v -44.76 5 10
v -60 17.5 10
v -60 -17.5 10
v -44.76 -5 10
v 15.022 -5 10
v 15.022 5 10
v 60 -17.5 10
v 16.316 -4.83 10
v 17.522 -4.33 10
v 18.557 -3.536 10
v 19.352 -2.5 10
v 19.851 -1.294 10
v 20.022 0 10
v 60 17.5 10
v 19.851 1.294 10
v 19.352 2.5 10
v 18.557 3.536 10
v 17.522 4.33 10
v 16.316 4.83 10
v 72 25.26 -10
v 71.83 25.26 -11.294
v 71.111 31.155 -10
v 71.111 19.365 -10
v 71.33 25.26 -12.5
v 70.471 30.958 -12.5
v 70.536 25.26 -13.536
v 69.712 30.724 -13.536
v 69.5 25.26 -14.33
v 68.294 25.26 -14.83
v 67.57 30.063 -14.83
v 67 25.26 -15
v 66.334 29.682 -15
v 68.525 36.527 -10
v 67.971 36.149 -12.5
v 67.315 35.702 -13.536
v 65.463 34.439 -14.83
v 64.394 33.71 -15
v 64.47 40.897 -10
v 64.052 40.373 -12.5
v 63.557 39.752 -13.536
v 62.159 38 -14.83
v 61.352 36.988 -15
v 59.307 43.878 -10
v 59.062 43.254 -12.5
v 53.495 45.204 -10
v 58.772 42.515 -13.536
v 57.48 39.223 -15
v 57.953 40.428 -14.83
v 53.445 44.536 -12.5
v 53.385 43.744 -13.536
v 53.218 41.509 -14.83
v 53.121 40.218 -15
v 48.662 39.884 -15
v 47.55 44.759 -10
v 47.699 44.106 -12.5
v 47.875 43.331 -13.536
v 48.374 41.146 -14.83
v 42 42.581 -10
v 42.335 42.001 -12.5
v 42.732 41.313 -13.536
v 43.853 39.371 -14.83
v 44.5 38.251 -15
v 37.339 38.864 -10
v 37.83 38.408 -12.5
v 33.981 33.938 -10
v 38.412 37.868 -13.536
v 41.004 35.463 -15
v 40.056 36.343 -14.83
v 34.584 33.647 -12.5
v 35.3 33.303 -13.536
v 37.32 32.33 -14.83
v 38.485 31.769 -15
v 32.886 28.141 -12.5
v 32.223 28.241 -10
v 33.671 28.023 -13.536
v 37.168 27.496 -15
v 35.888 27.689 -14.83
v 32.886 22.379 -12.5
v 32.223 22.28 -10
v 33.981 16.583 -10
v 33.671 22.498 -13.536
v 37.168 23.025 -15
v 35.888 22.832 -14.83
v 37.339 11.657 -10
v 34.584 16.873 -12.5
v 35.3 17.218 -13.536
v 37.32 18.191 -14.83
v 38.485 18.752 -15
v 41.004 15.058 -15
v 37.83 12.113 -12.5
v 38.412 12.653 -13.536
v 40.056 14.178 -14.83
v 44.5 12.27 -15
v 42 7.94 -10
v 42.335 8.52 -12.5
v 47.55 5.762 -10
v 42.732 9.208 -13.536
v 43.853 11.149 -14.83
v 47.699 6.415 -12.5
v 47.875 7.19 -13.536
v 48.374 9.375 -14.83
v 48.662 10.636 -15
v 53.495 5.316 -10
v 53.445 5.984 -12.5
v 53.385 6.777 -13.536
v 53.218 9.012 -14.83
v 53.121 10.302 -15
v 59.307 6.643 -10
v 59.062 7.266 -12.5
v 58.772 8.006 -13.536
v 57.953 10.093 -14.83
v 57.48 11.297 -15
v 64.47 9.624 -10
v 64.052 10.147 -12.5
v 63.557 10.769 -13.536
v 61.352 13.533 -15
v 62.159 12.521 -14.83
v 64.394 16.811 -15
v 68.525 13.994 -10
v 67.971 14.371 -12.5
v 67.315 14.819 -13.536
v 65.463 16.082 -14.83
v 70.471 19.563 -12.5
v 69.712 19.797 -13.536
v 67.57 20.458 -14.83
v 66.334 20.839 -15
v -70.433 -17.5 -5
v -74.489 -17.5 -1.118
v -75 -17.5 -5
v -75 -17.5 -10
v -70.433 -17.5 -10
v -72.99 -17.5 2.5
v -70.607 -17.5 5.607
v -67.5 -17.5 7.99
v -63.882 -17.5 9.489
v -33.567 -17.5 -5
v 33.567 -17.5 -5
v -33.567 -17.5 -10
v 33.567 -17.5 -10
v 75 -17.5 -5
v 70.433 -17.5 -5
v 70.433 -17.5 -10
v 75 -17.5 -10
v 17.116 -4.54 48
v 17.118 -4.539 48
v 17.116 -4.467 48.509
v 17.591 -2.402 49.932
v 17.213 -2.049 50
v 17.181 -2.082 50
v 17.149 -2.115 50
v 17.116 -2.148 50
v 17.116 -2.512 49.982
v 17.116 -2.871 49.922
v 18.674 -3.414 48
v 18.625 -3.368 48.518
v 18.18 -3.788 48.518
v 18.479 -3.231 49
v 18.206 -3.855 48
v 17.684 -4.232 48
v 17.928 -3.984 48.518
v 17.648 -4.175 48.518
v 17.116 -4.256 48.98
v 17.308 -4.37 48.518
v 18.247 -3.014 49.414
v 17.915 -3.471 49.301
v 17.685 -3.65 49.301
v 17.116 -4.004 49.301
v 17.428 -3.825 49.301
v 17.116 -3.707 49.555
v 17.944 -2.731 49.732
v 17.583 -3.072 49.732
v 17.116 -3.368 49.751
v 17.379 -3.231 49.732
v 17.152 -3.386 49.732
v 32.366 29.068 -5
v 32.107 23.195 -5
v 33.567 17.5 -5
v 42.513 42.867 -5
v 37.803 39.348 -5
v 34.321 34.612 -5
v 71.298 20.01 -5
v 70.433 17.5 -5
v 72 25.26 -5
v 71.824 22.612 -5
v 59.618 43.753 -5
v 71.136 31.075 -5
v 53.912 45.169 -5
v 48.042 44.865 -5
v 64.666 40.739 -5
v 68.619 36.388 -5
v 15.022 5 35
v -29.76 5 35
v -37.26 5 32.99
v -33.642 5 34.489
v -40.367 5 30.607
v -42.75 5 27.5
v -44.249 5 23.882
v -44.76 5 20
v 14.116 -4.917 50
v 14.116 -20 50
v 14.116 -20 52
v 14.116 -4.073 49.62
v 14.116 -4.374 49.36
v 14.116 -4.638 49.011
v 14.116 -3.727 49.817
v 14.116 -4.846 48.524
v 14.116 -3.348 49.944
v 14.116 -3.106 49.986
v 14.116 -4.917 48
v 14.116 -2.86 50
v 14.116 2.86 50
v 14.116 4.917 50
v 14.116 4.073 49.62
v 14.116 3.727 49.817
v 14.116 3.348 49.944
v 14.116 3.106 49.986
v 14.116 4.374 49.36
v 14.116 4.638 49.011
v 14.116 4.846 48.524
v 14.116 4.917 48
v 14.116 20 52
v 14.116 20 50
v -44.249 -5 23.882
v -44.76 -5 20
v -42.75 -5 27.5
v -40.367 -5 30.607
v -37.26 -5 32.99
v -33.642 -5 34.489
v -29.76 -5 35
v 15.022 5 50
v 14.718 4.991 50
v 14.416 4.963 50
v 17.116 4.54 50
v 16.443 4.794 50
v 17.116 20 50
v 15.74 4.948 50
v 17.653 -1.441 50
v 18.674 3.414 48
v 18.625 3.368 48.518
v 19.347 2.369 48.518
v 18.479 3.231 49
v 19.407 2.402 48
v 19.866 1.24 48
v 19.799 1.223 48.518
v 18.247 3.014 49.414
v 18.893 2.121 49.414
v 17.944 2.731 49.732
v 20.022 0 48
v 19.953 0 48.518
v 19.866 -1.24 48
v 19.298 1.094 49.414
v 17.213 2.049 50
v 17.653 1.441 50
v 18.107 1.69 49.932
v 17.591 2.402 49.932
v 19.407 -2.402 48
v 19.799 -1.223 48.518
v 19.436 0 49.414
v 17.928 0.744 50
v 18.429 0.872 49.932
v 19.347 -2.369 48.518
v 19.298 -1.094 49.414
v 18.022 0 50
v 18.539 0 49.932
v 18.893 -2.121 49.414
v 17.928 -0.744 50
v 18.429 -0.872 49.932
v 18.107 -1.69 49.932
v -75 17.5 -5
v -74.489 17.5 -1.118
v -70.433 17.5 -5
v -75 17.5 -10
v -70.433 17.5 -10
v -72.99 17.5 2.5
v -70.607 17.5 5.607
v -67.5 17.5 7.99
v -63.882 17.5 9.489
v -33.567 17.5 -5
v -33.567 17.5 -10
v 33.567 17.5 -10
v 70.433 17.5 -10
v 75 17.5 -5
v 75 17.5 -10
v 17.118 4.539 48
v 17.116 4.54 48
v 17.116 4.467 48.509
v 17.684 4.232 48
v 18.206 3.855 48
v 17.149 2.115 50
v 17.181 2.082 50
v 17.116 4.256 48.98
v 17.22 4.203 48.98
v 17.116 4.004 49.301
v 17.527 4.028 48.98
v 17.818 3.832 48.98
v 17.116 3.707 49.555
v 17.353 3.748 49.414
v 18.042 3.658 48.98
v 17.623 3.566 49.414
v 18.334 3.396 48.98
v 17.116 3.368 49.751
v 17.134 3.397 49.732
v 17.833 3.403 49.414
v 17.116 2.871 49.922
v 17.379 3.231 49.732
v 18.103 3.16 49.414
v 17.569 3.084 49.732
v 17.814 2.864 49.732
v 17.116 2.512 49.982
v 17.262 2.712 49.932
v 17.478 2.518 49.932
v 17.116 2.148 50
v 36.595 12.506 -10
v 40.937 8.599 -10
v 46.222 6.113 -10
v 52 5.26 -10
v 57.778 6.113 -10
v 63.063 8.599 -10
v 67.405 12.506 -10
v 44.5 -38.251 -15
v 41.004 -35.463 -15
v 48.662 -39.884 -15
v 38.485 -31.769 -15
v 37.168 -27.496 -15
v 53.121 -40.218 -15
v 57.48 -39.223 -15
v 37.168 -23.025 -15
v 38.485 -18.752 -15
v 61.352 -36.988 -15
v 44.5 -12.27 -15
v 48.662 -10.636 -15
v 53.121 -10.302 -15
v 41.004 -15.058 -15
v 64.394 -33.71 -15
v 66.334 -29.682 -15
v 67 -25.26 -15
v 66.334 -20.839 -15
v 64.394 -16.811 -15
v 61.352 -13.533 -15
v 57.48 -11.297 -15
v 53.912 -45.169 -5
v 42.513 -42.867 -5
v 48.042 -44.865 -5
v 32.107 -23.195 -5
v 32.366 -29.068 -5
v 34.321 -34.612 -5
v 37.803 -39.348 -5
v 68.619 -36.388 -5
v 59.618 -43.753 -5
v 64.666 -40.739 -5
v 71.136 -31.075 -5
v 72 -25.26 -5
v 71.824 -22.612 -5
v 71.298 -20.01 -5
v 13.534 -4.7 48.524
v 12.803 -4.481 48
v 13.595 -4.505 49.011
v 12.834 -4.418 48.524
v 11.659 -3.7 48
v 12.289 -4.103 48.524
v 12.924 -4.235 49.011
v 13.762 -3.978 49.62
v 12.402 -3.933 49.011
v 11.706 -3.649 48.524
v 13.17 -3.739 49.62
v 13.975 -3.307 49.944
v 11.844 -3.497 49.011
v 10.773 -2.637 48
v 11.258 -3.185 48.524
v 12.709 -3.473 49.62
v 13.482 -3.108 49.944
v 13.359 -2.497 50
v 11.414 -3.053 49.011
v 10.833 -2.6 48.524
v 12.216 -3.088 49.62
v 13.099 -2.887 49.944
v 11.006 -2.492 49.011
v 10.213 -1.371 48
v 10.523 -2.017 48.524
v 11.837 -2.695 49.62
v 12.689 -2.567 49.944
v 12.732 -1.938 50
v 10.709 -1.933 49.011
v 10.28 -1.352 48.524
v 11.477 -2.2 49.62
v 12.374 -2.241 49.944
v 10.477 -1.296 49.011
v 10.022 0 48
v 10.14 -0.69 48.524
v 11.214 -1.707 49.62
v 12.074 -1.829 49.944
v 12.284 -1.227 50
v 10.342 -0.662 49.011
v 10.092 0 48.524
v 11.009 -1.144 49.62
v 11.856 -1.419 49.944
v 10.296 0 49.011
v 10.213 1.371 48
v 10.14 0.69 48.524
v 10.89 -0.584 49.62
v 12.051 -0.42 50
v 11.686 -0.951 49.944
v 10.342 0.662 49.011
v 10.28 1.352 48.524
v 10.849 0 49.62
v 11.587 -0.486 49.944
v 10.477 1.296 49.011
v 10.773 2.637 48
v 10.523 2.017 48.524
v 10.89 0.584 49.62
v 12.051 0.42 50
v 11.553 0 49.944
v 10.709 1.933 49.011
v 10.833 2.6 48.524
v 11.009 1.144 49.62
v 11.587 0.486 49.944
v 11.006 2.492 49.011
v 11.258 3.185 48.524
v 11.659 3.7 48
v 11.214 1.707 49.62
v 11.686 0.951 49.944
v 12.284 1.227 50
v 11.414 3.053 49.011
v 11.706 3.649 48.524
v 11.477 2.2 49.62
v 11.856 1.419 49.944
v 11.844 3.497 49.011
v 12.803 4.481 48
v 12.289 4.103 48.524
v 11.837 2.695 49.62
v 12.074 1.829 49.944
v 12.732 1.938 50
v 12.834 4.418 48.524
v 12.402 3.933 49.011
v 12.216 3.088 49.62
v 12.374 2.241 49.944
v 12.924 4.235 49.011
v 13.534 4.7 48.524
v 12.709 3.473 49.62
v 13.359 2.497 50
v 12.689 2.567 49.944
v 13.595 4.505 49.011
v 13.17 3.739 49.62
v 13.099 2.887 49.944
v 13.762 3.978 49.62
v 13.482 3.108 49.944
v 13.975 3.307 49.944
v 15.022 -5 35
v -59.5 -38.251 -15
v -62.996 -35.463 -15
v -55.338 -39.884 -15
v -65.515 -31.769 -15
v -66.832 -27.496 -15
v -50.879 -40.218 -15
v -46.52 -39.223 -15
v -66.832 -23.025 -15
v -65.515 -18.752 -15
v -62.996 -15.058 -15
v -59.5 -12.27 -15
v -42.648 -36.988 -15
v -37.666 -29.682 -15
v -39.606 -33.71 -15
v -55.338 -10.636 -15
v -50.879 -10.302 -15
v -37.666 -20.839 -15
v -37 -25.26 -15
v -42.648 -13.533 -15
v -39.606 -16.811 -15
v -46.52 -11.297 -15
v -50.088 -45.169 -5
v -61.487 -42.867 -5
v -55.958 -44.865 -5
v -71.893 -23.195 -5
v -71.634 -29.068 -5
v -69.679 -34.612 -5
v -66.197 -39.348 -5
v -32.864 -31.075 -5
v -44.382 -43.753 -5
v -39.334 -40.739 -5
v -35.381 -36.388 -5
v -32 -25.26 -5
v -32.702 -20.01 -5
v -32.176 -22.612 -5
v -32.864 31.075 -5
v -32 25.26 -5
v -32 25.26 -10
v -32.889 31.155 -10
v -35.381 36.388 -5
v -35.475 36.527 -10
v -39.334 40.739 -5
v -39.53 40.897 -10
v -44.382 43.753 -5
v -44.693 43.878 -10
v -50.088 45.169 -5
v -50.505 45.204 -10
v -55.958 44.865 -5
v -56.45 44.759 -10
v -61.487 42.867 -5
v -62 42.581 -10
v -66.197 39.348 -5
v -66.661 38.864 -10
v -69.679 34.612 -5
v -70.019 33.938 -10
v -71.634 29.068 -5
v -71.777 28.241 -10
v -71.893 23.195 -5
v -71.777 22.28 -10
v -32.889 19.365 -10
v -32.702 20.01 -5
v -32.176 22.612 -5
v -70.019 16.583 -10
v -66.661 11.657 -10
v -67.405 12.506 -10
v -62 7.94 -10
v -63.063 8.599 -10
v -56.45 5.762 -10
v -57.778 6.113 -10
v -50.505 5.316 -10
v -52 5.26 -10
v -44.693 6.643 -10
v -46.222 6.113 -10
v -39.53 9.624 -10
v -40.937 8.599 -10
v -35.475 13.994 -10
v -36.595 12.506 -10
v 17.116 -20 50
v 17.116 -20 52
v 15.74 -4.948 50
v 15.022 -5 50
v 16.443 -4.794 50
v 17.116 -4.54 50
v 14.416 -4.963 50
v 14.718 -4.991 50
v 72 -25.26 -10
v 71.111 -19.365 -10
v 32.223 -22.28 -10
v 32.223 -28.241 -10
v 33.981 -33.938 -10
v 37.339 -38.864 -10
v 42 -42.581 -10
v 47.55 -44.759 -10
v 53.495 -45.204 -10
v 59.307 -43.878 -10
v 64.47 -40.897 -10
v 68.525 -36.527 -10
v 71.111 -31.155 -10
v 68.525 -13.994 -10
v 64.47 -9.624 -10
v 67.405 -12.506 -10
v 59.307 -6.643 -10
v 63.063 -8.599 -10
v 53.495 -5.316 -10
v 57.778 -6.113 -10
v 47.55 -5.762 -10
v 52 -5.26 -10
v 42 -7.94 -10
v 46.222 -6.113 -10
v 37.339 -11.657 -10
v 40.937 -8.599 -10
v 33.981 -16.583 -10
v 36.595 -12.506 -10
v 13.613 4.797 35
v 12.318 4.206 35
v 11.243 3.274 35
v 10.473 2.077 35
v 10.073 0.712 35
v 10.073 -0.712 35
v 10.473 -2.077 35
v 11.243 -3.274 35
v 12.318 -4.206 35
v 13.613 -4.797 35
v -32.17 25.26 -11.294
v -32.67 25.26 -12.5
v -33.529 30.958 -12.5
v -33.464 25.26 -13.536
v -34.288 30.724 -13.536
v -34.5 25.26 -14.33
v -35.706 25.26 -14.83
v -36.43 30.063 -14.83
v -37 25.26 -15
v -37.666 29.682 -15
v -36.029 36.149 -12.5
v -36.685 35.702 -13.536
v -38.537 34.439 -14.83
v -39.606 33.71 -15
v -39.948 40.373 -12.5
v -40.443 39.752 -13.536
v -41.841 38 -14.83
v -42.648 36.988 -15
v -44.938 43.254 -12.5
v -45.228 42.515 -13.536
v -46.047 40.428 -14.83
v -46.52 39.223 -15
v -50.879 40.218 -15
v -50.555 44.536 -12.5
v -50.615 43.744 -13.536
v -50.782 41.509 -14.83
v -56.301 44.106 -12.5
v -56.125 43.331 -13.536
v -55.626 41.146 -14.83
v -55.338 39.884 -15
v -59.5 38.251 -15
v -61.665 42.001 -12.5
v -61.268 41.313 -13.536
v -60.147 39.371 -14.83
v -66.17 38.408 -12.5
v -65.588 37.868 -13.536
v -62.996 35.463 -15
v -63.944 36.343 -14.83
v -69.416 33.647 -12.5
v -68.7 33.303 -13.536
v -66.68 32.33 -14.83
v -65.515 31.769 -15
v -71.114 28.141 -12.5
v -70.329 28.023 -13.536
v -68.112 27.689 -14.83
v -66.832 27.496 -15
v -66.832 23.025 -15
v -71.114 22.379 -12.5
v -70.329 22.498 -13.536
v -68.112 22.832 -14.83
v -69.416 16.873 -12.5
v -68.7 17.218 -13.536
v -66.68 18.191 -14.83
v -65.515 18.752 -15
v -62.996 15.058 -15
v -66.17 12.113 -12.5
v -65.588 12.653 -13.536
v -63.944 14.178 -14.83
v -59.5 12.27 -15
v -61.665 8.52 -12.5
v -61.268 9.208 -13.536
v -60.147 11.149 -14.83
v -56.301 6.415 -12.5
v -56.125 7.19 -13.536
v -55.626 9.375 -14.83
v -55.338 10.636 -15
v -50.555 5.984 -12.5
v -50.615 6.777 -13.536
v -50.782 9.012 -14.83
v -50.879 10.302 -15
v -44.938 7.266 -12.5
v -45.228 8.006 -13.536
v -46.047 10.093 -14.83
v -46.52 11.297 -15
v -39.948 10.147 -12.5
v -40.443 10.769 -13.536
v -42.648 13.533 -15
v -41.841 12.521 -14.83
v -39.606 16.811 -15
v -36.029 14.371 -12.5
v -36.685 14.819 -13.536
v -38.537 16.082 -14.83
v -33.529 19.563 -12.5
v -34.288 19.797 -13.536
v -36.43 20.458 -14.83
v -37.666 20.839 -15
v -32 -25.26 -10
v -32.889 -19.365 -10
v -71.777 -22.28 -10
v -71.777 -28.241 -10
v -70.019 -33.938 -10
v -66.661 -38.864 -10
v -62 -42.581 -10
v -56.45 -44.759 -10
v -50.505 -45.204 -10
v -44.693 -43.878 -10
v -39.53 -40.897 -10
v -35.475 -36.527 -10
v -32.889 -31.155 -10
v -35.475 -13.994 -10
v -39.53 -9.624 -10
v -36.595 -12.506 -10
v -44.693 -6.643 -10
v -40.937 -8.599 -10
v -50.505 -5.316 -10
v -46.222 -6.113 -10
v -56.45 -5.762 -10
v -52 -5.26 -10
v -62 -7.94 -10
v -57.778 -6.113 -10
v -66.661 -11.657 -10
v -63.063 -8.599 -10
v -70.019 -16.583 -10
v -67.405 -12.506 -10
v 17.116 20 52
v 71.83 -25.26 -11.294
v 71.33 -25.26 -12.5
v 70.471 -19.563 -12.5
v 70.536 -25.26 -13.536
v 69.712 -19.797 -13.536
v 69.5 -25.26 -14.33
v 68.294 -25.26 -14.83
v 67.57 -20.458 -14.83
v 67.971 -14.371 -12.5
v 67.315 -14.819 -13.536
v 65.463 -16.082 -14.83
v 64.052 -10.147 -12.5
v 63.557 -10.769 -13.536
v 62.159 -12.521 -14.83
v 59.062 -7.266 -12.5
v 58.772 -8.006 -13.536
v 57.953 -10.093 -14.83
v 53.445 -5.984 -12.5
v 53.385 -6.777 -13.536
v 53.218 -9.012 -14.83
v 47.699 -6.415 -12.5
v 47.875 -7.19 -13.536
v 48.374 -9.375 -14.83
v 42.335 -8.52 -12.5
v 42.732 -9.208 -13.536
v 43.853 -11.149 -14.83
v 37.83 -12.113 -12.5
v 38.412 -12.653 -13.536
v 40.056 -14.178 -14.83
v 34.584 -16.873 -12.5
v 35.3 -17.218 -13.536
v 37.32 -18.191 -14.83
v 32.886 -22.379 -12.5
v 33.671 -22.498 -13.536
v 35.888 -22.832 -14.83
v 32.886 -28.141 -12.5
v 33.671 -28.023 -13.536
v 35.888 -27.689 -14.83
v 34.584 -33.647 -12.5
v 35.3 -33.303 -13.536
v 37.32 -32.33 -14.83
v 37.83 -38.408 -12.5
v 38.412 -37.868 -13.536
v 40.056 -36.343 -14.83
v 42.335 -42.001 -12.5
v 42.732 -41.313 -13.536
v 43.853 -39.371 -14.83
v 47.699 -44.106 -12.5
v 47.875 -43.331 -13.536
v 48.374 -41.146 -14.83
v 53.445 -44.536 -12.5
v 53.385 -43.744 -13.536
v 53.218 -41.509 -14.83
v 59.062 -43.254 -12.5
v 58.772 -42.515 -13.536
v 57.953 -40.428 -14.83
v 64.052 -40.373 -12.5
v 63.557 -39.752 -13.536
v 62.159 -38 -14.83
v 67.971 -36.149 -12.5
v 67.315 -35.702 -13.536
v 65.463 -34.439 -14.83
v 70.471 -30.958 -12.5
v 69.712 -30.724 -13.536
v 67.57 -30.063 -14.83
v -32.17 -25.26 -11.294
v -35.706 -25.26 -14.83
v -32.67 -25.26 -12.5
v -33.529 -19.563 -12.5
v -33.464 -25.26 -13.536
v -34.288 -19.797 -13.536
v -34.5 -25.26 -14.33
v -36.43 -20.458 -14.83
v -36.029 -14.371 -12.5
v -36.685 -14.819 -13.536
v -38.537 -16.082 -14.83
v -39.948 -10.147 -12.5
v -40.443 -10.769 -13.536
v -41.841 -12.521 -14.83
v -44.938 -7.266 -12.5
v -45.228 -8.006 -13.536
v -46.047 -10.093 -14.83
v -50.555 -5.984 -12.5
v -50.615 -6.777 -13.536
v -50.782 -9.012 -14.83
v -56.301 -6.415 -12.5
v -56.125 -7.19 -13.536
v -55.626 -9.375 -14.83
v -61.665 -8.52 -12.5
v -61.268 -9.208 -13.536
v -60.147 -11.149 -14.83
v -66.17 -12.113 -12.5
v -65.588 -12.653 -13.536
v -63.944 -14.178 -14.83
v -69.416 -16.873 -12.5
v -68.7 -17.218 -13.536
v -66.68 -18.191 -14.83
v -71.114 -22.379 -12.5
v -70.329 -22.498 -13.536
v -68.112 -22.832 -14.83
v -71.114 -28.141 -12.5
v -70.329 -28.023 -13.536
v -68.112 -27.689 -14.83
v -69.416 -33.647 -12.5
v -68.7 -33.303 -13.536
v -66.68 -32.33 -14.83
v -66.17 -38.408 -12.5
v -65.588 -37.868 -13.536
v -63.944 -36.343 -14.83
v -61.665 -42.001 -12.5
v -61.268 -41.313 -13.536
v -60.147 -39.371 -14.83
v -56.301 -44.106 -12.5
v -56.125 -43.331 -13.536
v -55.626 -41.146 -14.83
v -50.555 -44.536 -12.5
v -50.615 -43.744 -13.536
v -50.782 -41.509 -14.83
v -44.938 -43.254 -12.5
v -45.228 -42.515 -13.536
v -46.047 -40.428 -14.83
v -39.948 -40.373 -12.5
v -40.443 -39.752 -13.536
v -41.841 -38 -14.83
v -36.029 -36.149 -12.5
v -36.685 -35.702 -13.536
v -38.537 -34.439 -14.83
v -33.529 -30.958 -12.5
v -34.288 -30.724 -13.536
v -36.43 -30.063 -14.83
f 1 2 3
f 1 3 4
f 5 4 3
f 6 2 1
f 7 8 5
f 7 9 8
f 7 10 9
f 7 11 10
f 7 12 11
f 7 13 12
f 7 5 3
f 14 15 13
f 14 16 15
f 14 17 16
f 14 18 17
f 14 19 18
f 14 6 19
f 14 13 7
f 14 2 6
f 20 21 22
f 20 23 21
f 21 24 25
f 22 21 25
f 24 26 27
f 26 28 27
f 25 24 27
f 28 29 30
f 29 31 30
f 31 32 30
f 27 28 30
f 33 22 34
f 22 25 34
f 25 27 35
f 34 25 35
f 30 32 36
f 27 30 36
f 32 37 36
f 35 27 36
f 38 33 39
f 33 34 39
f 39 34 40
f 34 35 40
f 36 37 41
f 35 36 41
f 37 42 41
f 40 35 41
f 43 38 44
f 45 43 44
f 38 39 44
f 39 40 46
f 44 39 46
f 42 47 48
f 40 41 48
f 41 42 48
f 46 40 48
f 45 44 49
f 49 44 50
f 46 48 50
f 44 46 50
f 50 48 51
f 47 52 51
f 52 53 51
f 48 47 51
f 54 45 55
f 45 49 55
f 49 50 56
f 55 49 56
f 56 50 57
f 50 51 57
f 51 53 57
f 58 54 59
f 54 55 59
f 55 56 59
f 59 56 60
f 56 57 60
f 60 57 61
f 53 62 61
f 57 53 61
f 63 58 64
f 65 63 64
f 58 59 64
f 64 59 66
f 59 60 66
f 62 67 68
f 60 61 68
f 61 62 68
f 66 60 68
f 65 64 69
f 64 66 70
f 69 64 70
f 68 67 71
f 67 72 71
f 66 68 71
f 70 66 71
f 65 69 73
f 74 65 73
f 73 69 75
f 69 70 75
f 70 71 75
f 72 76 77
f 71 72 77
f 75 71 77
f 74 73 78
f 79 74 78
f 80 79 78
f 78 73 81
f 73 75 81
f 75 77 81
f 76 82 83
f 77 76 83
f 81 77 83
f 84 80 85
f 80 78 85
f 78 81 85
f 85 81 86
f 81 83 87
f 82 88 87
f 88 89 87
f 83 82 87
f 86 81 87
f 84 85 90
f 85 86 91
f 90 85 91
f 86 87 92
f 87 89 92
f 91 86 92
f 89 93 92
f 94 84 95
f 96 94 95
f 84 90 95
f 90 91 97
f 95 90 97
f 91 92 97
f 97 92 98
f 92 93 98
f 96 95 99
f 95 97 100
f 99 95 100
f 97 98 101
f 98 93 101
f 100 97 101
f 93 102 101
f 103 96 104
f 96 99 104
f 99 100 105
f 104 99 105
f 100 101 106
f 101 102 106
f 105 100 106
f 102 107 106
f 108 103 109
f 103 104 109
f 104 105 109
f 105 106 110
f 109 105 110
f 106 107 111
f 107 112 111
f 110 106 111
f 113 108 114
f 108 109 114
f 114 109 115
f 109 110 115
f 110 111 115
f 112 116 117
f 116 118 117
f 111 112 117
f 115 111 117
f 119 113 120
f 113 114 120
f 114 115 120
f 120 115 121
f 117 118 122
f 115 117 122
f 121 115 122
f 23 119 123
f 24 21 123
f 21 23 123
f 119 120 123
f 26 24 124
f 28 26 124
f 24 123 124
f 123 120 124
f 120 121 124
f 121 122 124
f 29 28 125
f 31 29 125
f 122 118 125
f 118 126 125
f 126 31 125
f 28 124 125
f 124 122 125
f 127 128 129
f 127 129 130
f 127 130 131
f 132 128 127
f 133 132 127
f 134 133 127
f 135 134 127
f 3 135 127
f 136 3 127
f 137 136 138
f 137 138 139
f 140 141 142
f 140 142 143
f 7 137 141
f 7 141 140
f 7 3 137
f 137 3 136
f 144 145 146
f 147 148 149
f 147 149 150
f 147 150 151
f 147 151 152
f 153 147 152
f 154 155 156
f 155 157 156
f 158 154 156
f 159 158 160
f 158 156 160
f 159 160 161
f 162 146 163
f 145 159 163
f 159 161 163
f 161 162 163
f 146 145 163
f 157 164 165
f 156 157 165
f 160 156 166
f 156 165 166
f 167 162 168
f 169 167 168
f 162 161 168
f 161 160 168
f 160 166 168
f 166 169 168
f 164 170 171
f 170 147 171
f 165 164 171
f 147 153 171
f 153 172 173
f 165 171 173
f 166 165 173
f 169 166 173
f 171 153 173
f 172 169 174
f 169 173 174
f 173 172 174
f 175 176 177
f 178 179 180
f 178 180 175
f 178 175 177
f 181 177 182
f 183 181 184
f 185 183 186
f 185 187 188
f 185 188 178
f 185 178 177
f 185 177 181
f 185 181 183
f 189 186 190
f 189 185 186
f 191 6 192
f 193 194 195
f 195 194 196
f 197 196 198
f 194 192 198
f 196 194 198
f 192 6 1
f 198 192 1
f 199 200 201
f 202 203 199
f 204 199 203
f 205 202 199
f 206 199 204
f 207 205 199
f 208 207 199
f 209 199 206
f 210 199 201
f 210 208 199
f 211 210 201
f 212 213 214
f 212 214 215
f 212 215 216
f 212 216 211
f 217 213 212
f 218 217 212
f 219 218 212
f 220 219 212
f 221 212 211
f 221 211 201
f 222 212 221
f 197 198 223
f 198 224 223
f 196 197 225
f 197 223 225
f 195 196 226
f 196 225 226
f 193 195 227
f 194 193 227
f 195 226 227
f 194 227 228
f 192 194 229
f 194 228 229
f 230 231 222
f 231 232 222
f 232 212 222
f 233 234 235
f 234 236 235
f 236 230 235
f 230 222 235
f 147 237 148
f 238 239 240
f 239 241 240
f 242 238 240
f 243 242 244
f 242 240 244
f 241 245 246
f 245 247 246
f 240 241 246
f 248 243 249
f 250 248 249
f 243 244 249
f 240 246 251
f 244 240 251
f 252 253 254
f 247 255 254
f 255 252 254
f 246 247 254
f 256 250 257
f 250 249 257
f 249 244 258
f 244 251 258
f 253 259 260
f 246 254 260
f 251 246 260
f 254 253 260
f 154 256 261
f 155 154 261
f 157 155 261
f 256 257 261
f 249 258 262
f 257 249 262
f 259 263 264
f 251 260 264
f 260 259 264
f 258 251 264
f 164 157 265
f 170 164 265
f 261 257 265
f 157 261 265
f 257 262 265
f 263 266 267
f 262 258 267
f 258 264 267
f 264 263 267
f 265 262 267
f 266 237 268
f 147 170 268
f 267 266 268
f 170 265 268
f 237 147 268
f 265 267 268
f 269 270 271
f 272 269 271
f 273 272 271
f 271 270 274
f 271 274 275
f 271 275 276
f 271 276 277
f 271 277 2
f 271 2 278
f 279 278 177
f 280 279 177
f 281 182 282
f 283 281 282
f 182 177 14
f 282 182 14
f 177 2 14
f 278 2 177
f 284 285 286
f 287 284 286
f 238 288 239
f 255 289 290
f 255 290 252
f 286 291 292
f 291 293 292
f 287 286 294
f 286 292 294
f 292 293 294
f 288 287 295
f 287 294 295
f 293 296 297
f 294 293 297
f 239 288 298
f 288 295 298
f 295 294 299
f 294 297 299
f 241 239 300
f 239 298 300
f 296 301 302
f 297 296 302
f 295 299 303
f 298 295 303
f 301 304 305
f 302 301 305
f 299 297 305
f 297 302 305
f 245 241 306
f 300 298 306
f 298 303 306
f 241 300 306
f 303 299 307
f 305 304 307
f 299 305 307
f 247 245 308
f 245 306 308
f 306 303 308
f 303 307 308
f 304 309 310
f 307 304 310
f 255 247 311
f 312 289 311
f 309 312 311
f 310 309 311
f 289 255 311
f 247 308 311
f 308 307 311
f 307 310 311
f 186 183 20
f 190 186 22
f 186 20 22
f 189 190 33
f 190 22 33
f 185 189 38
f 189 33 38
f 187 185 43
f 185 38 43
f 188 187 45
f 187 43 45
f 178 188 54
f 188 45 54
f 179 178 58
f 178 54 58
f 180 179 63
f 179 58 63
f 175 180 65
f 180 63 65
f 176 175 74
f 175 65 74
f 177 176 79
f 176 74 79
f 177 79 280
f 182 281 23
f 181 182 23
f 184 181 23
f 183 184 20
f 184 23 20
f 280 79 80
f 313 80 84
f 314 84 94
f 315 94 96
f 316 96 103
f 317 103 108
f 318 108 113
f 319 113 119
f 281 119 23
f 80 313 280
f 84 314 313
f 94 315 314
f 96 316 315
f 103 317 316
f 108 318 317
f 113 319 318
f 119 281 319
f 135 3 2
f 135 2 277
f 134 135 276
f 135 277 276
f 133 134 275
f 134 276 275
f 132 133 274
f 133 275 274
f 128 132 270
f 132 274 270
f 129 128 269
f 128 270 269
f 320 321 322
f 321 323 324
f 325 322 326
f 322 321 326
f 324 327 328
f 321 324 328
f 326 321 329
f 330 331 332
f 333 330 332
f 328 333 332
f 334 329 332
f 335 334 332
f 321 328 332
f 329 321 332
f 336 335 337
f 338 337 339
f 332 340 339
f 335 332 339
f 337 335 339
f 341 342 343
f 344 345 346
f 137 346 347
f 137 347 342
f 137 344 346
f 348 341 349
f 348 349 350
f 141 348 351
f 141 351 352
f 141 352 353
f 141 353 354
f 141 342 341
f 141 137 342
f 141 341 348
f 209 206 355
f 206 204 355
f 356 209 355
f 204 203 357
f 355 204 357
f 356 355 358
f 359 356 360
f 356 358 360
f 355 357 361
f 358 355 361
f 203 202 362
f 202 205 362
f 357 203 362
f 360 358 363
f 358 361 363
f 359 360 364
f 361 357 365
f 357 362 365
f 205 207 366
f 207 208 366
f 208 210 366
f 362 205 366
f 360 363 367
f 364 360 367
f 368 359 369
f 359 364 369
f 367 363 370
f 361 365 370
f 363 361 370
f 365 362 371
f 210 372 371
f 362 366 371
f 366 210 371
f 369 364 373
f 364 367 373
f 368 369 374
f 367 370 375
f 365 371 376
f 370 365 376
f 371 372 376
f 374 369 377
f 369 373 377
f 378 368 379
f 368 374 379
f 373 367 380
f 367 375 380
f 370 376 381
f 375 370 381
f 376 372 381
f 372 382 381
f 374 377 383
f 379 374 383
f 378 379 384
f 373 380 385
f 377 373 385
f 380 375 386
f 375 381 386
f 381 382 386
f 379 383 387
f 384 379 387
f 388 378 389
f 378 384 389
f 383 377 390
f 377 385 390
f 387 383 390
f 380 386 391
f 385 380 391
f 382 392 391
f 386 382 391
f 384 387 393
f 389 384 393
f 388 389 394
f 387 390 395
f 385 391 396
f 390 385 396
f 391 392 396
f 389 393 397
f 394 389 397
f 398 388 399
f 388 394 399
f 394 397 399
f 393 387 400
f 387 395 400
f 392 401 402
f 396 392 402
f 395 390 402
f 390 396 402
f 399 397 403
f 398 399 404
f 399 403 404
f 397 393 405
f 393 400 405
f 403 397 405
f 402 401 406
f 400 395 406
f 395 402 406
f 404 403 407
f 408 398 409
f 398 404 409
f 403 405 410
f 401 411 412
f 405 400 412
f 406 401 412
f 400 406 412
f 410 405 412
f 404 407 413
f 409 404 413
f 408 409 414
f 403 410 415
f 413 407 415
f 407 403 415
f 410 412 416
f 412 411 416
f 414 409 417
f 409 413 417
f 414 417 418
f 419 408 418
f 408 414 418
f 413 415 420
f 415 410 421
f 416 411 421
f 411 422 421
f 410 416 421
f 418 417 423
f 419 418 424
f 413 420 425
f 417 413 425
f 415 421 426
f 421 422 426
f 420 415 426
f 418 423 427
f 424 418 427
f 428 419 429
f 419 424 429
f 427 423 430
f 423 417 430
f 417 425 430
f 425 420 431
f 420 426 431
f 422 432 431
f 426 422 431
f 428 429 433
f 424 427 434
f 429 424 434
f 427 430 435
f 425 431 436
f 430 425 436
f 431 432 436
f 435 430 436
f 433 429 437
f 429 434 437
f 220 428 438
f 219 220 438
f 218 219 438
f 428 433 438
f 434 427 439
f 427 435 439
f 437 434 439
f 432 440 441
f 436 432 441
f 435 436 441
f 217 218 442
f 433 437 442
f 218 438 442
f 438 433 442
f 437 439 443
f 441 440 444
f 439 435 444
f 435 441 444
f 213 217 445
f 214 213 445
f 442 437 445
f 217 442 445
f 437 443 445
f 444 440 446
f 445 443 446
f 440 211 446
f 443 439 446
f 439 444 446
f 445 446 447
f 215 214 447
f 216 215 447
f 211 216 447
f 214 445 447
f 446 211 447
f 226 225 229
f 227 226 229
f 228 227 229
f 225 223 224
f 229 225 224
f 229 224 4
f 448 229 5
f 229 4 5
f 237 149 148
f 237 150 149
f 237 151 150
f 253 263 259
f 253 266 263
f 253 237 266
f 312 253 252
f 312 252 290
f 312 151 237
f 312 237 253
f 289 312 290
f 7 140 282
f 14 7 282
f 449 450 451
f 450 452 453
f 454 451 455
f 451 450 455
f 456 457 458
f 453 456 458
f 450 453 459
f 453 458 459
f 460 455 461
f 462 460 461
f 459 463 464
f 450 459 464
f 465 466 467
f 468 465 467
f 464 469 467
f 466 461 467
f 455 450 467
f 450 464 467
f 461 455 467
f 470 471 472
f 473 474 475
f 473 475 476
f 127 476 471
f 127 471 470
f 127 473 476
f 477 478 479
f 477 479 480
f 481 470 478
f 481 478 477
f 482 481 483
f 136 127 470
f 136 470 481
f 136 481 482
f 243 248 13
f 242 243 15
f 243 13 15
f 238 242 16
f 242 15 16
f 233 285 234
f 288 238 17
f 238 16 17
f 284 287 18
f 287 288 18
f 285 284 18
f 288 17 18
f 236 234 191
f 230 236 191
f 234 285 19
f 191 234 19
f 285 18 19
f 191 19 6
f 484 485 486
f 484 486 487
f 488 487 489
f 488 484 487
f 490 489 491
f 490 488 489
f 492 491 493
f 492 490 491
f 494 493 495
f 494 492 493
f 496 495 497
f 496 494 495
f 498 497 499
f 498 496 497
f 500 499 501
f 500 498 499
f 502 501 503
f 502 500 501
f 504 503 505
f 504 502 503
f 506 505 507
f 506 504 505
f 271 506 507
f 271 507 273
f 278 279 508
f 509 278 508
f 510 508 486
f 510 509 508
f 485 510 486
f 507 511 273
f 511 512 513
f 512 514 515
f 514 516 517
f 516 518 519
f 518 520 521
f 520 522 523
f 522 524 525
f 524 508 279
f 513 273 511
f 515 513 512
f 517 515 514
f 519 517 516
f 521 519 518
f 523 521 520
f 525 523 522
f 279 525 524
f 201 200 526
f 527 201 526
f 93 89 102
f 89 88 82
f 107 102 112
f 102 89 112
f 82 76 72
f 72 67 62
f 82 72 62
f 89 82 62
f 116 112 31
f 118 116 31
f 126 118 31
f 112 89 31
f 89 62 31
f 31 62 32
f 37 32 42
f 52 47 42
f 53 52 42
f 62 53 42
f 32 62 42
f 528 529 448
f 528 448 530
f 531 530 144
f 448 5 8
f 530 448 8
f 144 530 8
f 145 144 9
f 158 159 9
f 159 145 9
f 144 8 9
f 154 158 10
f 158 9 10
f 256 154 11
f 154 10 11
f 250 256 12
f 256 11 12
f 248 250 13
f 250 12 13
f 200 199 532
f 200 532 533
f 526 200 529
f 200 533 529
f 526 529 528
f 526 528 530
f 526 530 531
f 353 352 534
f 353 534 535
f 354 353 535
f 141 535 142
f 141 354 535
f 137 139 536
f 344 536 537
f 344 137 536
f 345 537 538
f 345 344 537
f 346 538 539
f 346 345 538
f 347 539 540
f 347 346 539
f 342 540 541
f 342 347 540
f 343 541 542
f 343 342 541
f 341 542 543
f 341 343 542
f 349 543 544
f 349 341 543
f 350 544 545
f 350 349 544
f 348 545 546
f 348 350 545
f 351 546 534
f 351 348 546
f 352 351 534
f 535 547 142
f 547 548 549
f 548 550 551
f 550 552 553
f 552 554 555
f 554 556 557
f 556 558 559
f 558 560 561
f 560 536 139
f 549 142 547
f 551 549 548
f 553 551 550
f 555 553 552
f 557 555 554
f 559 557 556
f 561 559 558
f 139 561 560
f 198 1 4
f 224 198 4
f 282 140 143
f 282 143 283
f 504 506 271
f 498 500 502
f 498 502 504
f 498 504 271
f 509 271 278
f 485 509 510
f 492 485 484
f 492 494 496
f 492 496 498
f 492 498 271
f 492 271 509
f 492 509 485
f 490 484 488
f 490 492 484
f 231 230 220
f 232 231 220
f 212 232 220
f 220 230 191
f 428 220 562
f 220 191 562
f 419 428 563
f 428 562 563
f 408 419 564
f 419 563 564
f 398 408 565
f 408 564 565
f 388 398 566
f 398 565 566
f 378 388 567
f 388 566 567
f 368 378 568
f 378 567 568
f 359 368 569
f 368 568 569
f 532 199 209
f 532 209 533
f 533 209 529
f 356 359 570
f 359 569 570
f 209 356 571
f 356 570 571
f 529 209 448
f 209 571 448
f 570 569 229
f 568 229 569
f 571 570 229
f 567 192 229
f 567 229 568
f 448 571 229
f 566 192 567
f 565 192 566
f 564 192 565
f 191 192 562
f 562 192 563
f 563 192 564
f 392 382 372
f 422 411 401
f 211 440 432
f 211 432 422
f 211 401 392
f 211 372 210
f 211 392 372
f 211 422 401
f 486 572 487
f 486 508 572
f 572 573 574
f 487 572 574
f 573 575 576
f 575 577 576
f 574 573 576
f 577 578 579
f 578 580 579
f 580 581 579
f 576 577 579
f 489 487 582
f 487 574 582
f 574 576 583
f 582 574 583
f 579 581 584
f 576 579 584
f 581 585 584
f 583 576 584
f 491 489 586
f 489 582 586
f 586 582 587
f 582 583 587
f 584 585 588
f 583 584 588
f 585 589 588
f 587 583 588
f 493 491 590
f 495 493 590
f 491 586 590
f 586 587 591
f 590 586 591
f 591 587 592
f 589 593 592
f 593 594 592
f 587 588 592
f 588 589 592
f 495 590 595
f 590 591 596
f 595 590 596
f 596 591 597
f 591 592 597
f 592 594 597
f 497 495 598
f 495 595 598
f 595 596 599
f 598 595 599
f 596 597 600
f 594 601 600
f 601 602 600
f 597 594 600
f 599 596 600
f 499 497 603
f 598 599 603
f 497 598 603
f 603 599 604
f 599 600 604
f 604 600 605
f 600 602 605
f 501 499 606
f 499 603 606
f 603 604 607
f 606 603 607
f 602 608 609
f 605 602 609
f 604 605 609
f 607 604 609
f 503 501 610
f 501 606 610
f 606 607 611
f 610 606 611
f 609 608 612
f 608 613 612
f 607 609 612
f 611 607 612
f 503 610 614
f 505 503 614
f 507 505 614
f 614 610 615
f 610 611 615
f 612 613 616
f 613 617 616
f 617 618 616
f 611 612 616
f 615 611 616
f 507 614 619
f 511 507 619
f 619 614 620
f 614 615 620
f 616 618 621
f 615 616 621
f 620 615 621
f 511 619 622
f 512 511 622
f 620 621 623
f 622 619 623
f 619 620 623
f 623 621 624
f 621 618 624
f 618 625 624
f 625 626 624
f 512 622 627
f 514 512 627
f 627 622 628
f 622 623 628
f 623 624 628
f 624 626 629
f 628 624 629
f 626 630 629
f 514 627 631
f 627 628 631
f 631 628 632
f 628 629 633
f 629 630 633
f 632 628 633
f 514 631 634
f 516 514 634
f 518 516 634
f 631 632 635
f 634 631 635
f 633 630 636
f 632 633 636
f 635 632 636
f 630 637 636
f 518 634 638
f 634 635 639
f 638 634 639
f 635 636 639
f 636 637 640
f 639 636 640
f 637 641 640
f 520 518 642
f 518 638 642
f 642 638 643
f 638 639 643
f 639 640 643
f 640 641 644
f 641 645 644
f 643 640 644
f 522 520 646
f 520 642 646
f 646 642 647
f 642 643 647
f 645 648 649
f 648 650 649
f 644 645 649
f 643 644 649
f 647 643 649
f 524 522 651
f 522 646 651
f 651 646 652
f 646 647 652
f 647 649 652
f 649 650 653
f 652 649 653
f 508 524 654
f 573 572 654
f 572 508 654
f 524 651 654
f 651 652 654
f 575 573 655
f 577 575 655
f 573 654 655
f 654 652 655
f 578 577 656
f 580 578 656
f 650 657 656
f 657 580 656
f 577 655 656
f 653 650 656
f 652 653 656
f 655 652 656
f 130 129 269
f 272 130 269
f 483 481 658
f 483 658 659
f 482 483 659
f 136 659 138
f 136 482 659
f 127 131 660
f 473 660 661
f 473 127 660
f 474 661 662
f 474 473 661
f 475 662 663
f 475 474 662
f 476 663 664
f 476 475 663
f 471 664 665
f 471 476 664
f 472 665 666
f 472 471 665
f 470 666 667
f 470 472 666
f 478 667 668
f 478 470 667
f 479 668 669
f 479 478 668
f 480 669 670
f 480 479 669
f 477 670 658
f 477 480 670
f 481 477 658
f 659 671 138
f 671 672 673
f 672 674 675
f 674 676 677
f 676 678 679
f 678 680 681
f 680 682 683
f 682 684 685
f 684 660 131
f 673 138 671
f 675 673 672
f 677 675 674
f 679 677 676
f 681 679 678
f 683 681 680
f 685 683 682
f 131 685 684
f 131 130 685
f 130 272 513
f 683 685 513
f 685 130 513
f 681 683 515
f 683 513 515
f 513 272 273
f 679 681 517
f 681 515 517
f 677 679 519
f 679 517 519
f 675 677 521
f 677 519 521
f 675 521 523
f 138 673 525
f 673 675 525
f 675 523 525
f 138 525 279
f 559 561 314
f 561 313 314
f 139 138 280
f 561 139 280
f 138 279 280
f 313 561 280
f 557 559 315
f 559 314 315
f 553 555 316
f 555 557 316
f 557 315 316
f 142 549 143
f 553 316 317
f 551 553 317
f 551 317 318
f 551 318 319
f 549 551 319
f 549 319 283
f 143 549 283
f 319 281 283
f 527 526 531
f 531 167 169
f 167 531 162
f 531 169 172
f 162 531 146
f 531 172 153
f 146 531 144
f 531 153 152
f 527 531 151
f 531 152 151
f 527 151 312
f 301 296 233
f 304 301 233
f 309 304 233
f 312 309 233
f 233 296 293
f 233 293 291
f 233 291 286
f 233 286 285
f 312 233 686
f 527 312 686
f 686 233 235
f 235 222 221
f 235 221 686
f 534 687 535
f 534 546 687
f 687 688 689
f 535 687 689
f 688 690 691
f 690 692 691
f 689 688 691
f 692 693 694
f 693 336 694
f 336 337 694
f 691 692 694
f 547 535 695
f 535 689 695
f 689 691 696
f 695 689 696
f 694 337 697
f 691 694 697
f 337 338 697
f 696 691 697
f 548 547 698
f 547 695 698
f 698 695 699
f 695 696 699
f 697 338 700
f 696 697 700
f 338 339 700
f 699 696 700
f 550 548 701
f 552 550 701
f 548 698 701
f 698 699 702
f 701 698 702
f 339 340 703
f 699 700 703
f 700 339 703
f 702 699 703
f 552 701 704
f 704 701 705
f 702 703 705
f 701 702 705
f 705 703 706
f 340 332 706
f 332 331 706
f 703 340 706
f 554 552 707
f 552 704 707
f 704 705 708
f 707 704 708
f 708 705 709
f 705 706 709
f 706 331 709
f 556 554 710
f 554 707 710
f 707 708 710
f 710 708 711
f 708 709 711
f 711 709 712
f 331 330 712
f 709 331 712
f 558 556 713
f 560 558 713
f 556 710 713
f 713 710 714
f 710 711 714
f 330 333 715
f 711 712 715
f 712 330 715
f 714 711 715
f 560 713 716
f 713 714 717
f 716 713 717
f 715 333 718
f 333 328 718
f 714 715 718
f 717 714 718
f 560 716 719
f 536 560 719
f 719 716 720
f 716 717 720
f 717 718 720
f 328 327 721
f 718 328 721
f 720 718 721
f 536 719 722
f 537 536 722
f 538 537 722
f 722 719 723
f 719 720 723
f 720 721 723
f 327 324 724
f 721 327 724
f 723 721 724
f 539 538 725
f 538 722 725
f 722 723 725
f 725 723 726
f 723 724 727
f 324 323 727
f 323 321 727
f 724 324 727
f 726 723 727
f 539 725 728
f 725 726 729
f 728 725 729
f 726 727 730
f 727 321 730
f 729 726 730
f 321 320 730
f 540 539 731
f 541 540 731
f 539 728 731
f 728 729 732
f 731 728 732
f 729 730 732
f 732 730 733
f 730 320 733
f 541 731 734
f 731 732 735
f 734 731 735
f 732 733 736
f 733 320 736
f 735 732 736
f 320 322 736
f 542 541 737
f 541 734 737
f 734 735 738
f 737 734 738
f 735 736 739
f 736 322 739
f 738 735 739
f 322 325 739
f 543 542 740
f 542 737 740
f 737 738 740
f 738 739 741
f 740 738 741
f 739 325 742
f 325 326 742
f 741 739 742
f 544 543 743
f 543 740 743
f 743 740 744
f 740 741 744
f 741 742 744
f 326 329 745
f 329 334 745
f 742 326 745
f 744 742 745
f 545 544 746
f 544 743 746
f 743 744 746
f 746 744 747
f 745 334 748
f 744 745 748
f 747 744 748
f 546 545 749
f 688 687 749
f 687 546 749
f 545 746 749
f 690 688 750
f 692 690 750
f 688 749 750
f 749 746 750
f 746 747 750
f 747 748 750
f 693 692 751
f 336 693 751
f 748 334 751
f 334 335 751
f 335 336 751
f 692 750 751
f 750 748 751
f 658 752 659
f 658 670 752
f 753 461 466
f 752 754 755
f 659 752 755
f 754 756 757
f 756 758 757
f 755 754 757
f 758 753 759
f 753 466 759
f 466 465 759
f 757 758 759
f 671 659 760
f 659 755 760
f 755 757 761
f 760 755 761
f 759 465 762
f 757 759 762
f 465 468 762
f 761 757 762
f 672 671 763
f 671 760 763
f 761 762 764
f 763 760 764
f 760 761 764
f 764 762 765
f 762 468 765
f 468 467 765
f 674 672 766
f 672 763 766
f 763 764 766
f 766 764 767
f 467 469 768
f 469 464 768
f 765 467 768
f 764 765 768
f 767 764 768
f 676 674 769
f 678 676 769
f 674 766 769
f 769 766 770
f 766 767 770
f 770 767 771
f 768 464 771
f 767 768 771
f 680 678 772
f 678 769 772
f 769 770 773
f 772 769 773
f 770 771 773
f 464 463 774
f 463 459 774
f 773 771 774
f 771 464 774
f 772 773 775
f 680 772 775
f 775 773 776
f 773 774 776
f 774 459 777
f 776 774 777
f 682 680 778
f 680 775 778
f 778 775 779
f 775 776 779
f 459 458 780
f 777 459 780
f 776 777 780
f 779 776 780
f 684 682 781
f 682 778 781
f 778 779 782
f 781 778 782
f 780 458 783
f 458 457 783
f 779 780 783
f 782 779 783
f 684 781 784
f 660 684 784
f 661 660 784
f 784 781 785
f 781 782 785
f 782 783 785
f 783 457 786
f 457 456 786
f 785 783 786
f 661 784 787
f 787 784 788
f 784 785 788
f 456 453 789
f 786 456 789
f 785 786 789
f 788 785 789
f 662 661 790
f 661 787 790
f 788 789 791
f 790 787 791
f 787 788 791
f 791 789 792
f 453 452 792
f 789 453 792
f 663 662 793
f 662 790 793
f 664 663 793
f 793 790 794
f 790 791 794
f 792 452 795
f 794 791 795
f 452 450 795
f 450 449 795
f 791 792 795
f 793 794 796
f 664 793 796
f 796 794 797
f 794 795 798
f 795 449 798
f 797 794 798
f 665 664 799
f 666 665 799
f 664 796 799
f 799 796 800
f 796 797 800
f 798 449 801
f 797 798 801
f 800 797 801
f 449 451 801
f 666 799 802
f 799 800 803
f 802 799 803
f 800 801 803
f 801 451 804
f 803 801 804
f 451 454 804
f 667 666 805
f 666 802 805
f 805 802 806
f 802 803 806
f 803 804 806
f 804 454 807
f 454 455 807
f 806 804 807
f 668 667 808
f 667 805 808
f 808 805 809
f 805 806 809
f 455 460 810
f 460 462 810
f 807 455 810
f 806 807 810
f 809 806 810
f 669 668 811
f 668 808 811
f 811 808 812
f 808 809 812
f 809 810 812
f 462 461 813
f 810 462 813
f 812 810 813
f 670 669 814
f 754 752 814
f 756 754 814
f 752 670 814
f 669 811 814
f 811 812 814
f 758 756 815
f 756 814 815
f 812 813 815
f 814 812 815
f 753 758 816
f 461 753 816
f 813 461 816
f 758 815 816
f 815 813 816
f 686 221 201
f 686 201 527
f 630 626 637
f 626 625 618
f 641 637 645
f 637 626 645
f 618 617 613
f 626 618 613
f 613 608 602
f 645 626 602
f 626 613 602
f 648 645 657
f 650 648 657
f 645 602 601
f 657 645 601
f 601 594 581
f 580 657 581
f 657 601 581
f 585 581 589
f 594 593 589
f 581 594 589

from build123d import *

# Parameters (mm, degrees)
F0_W          = 150
F0_H          = 35
F1_DEPTH      = 10
F3_R          = 20
F4_DEPTH      = 5
F5_R          = 15
F6_SIZE       = 15
F7_R          = 4.99999
F10_DEPTH     = 40
F11_DEPTH     = 25
F12_R         = 15
F14_W         = 3
F14_H         = 40
F15_DEPTH     = 2
F16_T3_ANGLE  = 273.8677552215
F16_T7_ANGLE  = 273.8677552215
F16_T11_ANGLE = 245.1581434466
F16_T15_ANGLE = 245.1581434466


# Not quite as in the source:
# - a fillet or chamfer that OpenCascade refuses, or shapes differently, is made with other operations: its cross-section is extruded or revolved along the edge and cut away or added
# - a fillet or chamfer is up to 0.001 mm smaller than in the source, because OpenCascade refuses the exact size


with BuildPart() as f1:
    # F0 (on Top) → F1 (new body, symmetric)
    with BuildSketch(Plane.XY):
        Rectangle(F0_W, F0_H)
    extrude(amount=F1_DEPTH, both=True)

    # F3 (on offset) → F4 (join, symmetric)
    with BuildSketch(Plane.XY.offset(-10)):
        with Locations((-52, -25.2603590488)):
            Circle(F3_R)
        with Locations((52, -25.2603590488)):
            Circle(F3_R)
        with Locations((52, 25.2603590488)):
            Circle(F3_R)
        with Locations((-52, 25.2603590488)):
            Circle(F3_R)
    extrude(amount=F4_DEPTH, both=True)

    # F5
    f5_edges = [f1.edges().sort_by_distance(p)[0] for p in [
        (-75, 0, 10),
    ]]
    fillet(f5_edges, radius=F5_R)

    # F6
    f6_edges = [f1.edges().sort_by_distance(p)[0] for p in [
        (75, 0, 10),
    ]]
    chamfer(f6_edges, length=F6_SIZE)

    # F7 (radius 5 in the source; OpenCascade refuses exactly that, so slightly less here)
    f7_edges = [f1.edges().sort_by_distance(p)[0] for p in [
        (32, -25.260359, -15),
        (32, 25.260359, -15),
        (-72, -25.260359, -15),
        (-72, 25.260359, -15),
    ]]
    fillet(f7_edges, radius=F7_R)

    # F9 (on offset) → F10 (join)
    with BuildSketch(Plane.XY.offset(10)):
        with BuildLine():
            ThreePointArc((15.0216268376, 5), (10.0216268376, 0), (15.0216268376, -5))
            ThreePointArc((15.0216268376, -5), (18.5571607435, -3.5355339059), (20.0216268376, 0))
            ThreePointArc((20.0216268376, 0), (18.5571607435, 3.5355339059), (15.0216268376, 5))
        make_face()
    extrude(amount=F10_DEPTH)

    # F9 (on offset) → F11 (join)
    with BuildSketch(Plane.XY.offset(10)):
        with BuildLine():
            Line((-44.7599912546, -5), (15.0216268376, -5))
            ThreePointArc((15.0216268376, -5), (10.0216268376, 0), (15.0216268376, 5))
            Line((15.0216268376, 5), (-44.7599912546, 5))
            Line((-44.7599912546, 5), (-44.7599912546, -5))
        make_face()
    extrude(amount=F11_DEPTH)

    # F12
    f12_edges = [f1.edges().sort_by_distance(p)[0] for p in [
        (-44.759991, 0, 35),
    ]]
    fillet(f12_edges, radius=F12_R)

    # F14 (on offset) → F15 (join)
    with BuildSketch(Plane.XY.offset(50)):
        with Locations((15.6161214935, 0)):
            Rectangle(F14_W, F14_H)
    extrude(amount=F15_DEPTH)

    # F16: fillet of radius 2 on 2 edges, made by hand


with BuildPart() as f16_tool1:
    # F16_s2 → F16_t3 (revolve)
    with BuildSketch(Plane(origin=(7.0041804705, 7.4937067775, 0), x_dir=(0, 0, 1), z_dir=(0.6828419269, 0.7305661522, 0))):
        with BuildLine():
            ThreePointArc((48, 15.9742921192), (49.4142135624, 15.3885056815), (50, 13.9742921192))
            Line((50, 13.9742921192), (50, 15.9742921192))
            Line((50, 15.9742921192), (48, 15.9742921192))
        make_face()
    revolve(axis=Axis((15.0216268376, 0, 50), (0, 0, -1)), revolution_arc=F16_T3_ANGLE)

    split(bisect_by=Plane.YZ.offset(17.1161214935), keep=Keep.TOP)


with BuildPart() as f16_tool5:
    # F16_s6 → F16_t7 (revolve)
    with BuildSketch(Plane(origin=(7.0041804705, 7.4937067775, 0), x_dir=(0, 0, 1), z_dir=(0.6828419269, 0.7305661522, 0))):
        with BuildLine():
            ThreePointArc((48, 15.9742921192), (49.4142135624, 15.3885056815), (50, 13.9742921192))
            Line((50, 13.9742921192), (50, 15.9742921192))
            Line((50, 15.9742921192), (48, 15.9742921192))
        make_face()
    revolve(axis=Axis((15.0216268376, 0, 50), (0, 0, -1)), revolution_arc=F16_T7_ANGLE)

    split(bisect_by=Plane.YZ.offset(14.1161214935), keep=Keep.BOTTOM)


with BuildPart() as f16_tool9:
    # F16_s10 → F16_t11 (revolve)
    with BuildSketch(Plane(origin=(10.6662198, 6.8158439522, 0), x_dir=(0, 0, 1), z_dir=(-0.8426491362, -0.5384630287, 0))):
        with BuildLine():
            ThreePointArc((48, -3.0885906834), (49.4142135624, -3.674377121), (50, -5.0885906834))
            Line((50, -5.0885906834), (50, -3.0885906834))
            Line((50, -3.0885906834), (48, -3.0885906834))
        make_face()
    revolve(axis=Axis((15.0216268376, 0, 50), (0, 0, -1)), revolution_arc=F16_T11_ANGLE)

    split(bisect_by=Plane.YZ.offset(14.1161214935), keep=Keep.BOTTOM)


with BuildPart() as f16_tool13:
    # F16_s14 → F16_t15 (revolve)
    with BuildSketch(Plane(origin=(10.6662198, 6.8158439522, 0), x_dir=(0, 0, 1), z_dir=(-0.8426491362, -0.5384630287, 0))):
        with BuildLine():
            ThreePointArc((48, -3.0885906834), (49.4142135624, -3.674377121), (50, -5.0885906834))
            Line((50, -5.0885906834), (50, -3.0885906834))
            Line((50, -3.0885906834), (48, -3.0885906834))
        make_face()
    revolve(axis=Axis((15.0216268376, 0, 50), (0, 0, -1)), revolution_arc=F16_T15_ANGLE)

    split(bisect_by=Plane.YZ.offset(17.1161214935), keep=Keep.TOP)


with BuildPart() as f1_1:
    add(f1.part)

    # F16_t17: cut F16_tool1, F16_tool5, F16_tool9, F16_tool13
    add([f16_tool1.part, f16_tool5.part, f16_tool9.part, f16_tool13.part], mode=Mode.SUBTRACT)


solid = f1_1.part
